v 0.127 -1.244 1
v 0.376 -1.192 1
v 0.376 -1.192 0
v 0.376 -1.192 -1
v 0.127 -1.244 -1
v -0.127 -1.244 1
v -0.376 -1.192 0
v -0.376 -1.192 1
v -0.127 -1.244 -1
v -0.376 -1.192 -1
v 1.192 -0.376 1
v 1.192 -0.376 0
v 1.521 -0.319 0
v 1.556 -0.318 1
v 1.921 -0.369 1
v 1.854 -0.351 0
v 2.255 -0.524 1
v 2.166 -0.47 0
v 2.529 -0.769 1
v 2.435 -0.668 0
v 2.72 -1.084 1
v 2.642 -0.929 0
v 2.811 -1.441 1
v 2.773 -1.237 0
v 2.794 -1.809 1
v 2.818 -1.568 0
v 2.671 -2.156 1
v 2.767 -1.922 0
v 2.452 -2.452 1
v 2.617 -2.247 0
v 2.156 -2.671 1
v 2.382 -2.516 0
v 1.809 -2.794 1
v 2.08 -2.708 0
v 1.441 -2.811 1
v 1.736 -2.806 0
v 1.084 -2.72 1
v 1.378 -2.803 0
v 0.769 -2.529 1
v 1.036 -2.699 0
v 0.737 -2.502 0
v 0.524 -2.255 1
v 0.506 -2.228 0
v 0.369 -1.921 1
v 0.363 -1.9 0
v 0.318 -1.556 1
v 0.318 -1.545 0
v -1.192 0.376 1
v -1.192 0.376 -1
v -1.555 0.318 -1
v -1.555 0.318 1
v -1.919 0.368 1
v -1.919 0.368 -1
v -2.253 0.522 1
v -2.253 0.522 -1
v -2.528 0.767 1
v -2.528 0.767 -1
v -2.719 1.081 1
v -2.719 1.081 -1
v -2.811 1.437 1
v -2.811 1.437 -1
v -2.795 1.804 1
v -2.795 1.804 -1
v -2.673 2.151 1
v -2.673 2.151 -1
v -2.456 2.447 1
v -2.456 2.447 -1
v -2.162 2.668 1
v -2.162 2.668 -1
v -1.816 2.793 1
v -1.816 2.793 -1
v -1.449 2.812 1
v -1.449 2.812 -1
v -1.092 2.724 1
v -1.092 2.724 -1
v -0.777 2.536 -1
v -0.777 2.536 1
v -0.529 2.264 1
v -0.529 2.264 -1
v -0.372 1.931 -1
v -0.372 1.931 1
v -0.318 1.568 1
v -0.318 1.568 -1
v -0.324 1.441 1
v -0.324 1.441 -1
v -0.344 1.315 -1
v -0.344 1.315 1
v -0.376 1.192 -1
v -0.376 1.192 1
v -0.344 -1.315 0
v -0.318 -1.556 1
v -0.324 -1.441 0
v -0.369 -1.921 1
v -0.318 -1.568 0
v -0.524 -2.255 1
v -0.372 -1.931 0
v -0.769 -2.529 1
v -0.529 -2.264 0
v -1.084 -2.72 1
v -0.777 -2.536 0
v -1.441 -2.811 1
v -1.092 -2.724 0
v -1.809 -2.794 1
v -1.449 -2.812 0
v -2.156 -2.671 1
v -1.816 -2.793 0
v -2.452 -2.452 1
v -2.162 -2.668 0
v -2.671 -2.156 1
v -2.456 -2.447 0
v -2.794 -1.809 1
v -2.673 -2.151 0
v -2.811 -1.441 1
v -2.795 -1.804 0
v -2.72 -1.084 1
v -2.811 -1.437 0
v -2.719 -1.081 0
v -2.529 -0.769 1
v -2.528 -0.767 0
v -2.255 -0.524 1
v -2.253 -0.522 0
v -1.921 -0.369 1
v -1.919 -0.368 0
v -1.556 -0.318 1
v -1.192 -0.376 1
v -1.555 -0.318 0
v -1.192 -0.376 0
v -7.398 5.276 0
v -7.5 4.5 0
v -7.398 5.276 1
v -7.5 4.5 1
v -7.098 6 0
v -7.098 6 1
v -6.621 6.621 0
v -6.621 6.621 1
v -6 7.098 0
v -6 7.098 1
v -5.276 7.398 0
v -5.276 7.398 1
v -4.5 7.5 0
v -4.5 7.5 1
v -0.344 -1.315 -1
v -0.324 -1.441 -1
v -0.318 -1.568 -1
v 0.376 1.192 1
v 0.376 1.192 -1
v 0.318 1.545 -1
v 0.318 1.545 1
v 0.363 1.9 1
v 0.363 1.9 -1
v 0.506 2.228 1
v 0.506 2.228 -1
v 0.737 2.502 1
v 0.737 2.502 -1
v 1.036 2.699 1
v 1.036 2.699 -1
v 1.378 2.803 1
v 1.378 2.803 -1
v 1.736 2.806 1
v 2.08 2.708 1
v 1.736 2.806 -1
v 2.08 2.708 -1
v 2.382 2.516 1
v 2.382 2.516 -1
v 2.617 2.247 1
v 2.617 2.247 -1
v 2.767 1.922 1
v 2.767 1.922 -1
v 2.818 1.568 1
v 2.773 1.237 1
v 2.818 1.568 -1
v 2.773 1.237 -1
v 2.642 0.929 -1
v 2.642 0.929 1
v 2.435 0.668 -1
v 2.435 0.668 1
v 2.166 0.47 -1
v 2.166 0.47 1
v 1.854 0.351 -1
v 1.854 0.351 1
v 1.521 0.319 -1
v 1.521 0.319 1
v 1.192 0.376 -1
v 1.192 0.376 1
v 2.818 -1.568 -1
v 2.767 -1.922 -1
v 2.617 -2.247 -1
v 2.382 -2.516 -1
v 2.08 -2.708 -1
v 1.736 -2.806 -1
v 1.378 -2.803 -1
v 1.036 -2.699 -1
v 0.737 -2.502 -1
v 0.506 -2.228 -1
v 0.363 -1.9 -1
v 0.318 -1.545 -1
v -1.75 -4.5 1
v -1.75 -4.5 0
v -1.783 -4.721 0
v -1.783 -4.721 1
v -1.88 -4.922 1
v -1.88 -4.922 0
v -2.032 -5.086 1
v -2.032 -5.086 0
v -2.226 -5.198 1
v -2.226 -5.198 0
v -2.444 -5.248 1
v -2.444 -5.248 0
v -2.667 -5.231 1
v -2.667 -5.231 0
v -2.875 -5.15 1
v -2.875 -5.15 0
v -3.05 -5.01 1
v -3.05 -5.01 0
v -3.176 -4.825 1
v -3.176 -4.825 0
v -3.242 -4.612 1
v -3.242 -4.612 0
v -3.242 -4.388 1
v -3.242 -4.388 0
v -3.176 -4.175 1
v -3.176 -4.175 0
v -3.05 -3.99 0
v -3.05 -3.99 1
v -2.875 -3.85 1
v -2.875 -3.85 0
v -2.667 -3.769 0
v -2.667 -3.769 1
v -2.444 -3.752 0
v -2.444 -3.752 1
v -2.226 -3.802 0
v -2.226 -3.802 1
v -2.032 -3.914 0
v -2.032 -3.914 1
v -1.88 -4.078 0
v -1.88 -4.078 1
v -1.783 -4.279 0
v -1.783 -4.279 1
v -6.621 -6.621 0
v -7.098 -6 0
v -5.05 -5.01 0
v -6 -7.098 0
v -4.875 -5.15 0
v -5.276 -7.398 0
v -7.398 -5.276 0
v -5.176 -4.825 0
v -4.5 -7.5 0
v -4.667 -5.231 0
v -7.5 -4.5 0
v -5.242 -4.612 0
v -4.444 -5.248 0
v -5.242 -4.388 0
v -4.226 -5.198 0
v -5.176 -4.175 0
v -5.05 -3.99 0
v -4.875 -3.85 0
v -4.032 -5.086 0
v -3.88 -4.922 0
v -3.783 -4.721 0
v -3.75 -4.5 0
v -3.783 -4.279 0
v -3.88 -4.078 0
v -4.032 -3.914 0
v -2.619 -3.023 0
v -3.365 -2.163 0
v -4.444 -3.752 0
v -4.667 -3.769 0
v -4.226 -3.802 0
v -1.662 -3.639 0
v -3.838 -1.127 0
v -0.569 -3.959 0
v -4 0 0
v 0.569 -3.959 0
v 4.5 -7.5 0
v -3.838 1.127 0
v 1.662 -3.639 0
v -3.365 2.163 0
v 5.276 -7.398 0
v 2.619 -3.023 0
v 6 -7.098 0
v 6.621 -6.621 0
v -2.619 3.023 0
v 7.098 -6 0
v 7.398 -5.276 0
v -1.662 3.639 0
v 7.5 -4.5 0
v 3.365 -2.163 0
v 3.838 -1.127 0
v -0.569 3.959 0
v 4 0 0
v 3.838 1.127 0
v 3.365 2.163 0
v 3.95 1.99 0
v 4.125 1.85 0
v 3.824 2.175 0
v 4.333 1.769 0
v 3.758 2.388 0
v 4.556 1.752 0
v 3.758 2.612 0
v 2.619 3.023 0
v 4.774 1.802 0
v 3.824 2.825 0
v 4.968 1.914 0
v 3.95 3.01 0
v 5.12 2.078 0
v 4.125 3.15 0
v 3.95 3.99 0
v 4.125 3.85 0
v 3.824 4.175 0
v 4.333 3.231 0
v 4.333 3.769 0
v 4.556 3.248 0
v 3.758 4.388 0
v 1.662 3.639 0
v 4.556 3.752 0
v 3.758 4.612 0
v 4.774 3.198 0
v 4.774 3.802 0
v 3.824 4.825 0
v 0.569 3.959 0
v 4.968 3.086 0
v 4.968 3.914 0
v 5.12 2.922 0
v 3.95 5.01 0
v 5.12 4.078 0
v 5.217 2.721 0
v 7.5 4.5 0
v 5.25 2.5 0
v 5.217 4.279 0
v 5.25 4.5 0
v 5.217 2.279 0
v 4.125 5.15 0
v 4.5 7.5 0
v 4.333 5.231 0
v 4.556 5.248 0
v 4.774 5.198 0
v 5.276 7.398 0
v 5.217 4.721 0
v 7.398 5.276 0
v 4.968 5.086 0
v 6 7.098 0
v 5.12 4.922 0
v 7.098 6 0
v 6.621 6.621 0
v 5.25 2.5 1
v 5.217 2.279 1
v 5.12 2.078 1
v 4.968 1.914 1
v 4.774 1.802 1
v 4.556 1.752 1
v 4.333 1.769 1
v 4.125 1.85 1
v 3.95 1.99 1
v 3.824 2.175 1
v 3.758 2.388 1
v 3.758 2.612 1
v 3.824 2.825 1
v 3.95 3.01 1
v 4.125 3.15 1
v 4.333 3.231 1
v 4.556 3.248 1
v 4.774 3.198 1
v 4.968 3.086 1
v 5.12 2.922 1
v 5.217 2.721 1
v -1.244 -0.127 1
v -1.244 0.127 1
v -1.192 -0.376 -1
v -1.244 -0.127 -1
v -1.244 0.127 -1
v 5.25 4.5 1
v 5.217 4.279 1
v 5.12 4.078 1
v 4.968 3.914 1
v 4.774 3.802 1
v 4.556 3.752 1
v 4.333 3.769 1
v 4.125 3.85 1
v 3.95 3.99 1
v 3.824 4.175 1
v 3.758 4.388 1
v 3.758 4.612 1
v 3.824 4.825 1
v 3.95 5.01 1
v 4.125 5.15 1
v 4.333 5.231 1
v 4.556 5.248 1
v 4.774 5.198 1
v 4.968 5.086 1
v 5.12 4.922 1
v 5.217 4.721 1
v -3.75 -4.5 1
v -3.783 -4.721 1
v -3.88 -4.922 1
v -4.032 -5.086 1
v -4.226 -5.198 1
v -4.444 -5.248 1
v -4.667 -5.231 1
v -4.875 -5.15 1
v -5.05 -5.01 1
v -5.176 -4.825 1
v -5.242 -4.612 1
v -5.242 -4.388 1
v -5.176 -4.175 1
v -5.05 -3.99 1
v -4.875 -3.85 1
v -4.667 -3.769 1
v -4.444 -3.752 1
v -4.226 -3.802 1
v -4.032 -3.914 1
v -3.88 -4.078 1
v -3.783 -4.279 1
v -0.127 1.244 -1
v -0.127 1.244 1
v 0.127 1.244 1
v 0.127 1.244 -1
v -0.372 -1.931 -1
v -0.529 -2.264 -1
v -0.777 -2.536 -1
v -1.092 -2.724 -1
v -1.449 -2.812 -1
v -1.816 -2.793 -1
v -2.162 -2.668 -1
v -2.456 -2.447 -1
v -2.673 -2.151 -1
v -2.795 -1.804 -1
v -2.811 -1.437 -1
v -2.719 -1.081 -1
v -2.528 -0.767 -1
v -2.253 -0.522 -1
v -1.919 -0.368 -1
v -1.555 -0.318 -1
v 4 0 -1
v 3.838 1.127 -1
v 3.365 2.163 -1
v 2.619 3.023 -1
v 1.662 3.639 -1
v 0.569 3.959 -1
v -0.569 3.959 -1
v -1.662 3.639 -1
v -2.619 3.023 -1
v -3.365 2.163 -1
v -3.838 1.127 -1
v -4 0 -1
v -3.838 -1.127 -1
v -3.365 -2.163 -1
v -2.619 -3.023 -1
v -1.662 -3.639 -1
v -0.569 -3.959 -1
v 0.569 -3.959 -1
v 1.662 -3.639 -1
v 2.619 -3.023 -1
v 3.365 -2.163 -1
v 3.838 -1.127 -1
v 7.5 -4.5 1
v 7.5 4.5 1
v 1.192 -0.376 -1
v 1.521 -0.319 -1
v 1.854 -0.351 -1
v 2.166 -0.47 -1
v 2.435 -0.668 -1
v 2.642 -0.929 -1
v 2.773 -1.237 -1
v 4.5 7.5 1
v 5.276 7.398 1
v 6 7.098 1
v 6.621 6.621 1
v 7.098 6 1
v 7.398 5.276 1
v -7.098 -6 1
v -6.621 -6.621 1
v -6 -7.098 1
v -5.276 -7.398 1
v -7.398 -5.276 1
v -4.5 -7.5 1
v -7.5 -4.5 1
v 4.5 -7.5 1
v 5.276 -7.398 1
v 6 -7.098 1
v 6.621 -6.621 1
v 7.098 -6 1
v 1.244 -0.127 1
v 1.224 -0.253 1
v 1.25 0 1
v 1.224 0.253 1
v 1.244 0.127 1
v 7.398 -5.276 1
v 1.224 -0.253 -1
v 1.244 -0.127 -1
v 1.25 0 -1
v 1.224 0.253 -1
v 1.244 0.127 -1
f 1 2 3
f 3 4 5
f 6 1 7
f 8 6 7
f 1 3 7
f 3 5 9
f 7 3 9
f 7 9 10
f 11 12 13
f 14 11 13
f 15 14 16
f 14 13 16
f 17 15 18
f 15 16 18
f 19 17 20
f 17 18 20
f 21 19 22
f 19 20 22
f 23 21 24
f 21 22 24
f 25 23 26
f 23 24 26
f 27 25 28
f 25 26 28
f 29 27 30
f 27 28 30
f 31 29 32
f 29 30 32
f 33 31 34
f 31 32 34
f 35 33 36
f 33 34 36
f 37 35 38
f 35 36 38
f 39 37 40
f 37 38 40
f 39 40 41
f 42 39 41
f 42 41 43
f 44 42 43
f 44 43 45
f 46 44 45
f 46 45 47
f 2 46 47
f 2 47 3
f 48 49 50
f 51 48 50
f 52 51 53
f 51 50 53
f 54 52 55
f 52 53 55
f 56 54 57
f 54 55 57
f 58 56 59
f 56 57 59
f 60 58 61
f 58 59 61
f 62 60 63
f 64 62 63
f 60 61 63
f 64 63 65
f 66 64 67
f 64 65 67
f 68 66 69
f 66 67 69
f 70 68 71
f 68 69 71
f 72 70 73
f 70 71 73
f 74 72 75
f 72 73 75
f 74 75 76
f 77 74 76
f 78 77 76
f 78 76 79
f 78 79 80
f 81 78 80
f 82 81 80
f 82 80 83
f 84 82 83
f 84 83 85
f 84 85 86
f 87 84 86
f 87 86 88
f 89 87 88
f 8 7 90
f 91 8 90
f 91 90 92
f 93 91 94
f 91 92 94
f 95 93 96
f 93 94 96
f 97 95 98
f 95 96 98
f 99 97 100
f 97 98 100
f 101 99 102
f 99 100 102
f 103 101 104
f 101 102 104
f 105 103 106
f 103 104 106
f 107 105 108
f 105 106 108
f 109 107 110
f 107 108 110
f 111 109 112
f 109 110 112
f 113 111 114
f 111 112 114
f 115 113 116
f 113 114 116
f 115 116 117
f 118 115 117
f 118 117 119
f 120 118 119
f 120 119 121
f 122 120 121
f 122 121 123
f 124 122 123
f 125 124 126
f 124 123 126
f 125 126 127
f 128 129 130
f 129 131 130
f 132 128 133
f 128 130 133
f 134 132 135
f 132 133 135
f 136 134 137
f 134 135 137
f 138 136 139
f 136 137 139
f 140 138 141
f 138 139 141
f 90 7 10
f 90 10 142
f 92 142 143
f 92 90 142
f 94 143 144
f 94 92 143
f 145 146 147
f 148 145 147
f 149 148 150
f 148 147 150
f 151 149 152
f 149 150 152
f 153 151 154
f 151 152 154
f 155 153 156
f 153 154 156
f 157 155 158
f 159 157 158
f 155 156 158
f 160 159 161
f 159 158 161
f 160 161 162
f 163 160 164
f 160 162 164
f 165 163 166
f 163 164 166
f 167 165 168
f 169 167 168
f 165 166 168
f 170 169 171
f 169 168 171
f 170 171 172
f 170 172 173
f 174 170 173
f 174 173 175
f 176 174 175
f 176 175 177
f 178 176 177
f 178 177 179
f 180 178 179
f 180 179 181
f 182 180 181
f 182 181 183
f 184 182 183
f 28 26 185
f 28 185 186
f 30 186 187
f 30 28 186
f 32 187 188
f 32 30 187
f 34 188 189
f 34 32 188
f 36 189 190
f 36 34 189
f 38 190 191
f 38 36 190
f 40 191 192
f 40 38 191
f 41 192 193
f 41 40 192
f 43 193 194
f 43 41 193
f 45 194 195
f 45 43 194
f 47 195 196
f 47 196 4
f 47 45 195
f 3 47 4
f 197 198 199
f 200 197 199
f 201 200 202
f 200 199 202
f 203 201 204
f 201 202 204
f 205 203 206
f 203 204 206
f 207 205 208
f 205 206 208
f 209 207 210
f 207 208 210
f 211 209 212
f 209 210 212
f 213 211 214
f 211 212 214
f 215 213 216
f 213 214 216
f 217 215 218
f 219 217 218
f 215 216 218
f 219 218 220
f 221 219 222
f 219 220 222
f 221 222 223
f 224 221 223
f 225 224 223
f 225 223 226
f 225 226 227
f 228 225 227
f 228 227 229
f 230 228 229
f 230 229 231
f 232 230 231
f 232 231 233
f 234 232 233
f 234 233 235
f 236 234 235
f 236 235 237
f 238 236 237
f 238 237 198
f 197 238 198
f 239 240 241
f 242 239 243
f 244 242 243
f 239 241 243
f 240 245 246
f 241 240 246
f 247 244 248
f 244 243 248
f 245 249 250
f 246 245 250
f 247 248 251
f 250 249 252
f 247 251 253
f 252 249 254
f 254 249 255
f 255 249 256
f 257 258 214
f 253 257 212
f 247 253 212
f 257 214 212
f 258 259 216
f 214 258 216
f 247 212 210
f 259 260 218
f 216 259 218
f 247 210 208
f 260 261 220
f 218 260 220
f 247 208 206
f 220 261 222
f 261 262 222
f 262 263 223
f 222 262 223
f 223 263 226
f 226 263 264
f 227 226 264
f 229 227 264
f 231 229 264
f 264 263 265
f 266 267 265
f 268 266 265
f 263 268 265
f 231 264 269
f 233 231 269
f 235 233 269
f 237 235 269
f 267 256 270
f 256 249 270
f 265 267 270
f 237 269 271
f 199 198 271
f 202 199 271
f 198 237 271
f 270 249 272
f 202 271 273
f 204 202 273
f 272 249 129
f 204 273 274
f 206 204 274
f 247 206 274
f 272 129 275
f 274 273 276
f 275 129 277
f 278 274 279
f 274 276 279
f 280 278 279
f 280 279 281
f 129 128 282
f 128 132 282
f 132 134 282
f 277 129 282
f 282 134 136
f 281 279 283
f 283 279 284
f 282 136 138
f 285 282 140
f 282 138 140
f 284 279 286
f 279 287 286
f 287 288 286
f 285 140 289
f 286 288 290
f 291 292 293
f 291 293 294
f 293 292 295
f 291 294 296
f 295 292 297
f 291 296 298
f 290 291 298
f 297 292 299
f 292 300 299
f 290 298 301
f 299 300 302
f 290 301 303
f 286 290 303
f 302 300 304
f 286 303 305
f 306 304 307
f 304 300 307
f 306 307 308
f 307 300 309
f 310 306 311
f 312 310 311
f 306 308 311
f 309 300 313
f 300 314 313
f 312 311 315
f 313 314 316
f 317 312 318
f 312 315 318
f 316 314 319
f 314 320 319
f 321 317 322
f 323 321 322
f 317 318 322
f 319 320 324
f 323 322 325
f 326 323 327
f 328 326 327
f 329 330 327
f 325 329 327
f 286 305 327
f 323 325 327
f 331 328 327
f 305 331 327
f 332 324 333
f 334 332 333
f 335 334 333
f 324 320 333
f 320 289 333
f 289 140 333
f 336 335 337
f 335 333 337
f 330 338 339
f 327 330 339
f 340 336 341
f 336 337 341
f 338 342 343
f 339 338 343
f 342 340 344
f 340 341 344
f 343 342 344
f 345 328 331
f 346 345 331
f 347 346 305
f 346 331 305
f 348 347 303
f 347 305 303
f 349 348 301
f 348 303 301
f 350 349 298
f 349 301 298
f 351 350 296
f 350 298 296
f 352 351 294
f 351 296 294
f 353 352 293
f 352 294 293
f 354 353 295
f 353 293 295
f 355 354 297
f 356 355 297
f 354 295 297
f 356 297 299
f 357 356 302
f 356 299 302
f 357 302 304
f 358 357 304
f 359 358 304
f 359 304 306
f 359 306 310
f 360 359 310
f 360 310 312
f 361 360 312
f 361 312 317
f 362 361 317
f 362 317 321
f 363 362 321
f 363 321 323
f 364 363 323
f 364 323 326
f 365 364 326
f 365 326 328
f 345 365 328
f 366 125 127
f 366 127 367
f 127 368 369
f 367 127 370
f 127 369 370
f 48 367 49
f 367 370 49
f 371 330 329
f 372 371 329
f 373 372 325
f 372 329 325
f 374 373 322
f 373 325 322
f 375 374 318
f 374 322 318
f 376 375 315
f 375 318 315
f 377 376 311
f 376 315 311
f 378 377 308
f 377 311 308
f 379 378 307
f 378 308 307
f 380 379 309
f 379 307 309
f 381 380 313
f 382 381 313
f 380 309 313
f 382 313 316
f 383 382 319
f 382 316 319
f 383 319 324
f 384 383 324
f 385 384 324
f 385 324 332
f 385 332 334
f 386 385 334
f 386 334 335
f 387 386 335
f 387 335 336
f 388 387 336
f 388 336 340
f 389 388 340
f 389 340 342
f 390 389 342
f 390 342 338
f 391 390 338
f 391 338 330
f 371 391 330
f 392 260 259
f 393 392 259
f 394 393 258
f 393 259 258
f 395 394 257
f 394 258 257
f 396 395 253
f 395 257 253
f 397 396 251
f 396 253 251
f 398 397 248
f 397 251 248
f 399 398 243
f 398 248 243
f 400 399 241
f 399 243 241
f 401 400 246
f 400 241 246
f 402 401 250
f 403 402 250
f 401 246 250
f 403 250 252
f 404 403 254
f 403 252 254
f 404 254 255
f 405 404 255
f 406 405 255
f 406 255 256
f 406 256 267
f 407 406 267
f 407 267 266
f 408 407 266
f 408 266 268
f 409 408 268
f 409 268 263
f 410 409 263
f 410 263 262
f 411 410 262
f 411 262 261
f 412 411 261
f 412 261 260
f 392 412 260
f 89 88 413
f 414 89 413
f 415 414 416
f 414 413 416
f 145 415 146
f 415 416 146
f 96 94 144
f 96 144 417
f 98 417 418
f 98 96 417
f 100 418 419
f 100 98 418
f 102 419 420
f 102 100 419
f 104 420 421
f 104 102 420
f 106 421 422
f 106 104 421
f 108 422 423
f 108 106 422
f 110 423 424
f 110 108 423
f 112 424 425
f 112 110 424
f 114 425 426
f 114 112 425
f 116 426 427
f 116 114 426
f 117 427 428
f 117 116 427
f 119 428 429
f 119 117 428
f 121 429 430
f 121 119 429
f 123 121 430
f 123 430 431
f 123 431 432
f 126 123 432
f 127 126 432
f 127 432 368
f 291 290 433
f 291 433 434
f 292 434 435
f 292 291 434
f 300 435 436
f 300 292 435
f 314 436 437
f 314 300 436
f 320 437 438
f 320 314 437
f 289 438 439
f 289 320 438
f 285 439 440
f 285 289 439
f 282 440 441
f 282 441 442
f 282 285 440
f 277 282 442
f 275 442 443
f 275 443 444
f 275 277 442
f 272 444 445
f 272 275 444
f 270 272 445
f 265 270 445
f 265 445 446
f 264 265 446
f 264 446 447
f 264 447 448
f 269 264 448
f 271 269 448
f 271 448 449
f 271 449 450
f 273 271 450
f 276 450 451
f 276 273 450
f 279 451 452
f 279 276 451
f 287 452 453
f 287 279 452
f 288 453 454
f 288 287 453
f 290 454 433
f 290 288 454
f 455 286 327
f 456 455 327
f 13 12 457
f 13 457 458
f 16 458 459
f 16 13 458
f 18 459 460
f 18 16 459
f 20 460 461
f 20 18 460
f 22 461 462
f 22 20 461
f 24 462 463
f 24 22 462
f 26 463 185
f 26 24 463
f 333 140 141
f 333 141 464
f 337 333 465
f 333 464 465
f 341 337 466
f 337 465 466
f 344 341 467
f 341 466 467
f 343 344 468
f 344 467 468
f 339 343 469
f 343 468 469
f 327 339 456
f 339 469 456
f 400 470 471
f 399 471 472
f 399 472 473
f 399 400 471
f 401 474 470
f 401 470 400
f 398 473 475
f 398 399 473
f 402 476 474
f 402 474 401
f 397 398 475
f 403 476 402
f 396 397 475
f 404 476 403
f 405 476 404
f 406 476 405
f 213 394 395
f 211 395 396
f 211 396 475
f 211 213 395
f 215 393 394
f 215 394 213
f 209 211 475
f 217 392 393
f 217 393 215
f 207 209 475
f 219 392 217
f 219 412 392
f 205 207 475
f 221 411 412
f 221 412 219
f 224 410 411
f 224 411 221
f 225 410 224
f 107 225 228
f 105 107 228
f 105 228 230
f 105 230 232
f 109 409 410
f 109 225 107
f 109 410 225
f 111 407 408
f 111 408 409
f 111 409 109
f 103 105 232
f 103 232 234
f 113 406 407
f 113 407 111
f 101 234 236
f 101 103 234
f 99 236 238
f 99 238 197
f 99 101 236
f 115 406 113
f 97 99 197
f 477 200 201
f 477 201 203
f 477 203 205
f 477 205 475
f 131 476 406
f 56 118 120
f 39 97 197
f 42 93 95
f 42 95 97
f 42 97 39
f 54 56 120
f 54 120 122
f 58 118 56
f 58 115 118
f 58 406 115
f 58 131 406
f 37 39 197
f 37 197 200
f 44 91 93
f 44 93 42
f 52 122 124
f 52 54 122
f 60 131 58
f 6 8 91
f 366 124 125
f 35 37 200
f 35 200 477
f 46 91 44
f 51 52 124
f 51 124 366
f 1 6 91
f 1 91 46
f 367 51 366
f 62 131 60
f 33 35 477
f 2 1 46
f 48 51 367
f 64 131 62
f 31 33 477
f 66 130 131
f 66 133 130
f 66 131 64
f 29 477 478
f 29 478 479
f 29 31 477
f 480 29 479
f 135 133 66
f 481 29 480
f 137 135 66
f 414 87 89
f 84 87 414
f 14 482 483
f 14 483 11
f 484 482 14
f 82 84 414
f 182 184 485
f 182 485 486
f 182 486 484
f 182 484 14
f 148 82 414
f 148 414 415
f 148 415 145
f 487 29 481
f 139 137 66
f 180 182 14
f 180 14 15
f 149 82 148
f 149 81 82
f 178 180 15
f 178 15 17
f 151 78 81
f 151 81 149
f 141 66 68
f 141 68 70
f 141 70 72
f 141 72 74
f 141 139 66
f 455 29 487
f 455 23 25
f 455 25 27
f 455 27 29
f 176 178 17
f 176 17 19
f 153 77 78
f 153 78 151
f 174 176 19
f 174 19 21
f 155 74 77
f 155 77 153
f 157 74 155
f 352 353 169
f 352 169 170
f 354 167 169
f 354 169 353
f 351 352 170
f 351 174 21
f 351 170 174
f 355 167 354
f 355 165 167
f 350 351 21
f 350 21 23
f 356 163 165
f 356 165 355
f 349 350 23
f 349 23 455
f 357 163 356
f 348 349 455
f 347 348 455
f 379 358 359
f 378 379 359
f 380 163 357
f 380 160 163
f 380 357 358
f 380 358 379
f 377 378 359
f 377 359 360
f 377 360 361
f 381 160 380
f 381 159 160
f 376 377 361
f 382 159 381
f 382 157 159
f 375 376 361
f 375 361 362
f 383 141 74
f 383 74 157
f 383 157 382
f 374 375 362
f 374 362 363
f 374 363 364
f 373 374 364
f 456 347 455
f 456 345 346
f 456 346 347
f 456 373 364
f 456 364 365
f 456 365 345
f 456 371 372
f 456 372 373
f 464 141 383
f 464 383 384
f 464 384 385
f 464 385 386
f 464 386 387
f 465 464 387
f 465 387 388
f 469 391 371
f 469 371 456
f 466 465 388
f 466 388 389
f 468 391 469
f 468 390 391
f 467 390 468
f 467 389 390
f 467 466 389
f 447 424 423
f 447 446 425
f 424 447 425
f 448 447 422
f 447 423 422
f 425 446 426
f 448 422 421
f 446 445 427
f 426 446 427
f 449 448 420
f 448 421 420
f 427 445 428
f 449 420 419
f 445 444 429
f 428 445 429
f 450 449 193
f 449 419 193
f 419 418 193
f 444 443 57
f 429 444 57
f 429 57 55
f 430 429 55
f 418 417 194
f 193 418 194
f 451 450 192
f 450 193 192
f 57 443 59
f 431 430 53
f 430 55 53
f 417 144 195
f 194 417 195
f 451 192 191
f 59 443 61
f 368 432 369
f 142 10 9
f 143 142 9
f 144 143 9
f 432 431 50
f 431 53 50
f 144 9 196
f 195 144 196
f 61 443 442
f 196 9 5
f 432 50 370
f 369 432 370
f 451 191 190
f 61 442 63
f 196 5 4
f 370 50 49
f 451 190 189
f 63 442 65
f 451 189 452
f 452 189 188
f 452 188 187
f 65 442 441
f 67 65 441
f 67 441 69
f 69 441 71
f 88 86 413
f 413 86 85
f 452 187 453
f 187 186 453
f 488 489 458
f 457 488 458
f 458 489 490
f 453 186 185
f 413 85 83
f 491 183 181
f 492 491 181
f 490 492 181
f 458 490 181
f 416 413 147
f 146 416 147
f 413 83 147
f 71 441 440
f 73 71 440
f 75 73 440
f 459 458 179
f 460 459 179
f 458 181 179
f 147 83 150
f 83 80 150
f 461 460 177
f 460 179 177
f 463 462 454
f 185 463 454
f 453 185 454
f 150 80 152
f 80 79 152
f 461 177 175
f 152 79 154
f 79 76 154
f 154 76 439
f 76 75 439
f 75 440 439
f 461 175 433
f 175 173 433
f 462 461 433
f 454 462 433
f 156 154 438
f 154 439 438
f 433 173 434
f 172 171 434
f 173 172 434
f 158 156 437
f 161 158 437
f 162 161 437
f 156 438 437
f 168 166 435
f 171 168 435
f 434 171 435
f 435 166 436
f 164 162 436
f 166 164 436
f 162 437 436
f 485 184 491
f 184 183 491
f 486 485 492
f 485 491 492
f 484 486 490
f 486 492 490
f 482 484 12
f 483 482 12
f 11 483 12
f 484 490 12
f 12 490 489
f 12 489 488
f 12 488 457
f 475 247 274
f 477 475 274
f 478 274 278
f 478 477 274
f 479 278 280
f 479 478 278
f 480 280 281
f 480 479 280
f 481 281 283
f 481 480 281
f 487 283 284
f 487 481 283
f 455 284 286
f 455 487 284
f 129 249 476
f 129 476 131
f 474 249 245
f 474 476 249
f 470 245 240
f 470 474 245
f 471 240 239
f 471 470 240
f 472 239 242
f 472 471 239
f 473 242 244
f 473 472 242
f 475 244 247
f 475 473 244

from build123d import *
from build123d import SkipClean  # not in build123d's __all__

# Parameters (mm, degrees)
F0_R     = 4
F1_DEPTH = 1
F2_W     = 15
F2_H     = 15
F2_R     = 5
F2_R_2   = 4
F3_DEPTH = 1
F4_R     = 3
F5_R     = 0.75
F6_DEPTH = 25


# Not quite as in the source:
# - after a boolean that leaves OpenCascade's solid faulty, fix() repairs it


with BuildPart() as f1:
    # F0 (on Top) → F1 (new body)
    with BuildSketch(Plane.XY):
        Circle(F0_R)
        with BuildLine():
            ThreePointArc((1.1922665017, 0.3755004513), (1.2354823202, 0.1899564067), (1.25, 0))
            ThreePointArc((1.25, 0), (1.2354823202, -0.1899564067), (1.1922665017, -0.3755004513))
            ThreePointArc((1.1922665017, -0.3755004513), (2.3070654164, -0.559829563), (2.817766953, -1.567766953))
            ThreePointArc((2.817766953, -1.567766953), (1.3778105463, -2.8032492732), (0.3755004513, -1.1922665017))
            ThreePointArc((0.3755004513, -1.1922665017), (0, -1.25), (-0.3755004513, -1.1922665017))
            ThreePointArc((-0.3755004513, -1.1922665017), (-0.3322846327, -1.3778105463), (-0.317766953, -1.567766953))
            ThreePointArc((-0.317766953, -1.567766953), (-2.5757043429, -2.3070654164), (-1.1922665017, -0.3755004513))
            ThreePointArc((-1.1922665017, -0.3755004513), (-1.25, 0), (-1.1922665017, 0.3755004513))
            ThreePointArc((-1.1922665017, 0.3755004513), (-2.5757043429, 2.3070654164), (-0.317766953, 1.567766953))
            ThreePointArc((-0.317766953, 1.567766953), (-0.3322846327, 1.3778105463), (-0.3755004513, 1.1922665017))
            ThreePointArc((-0.3755004513, 1.1922665017), (0, 1.25), (0.3755004513, 1.1922665017))
            ThreePointArc((0.3755004513, 1.1922665017), (1.3778105463, 2.8032492732), (2.817766953, 1.567766953))
            ThreePointArc((2.817766953, 1.567766953), (2.3070654164, 0.559829563), (1.1922665017, 0.3755004513))
        make_face(mode=Mode.SUBTRACT)
    extrude(amount=-F1_DEPTH)

    # F2 (on face) → F3 (join)
    with BuildSketch(Plane.XY):
        Rectangle(F2_W, F2_H)
        Circle(F2_R, mode=Mode.SUBTRACT)
        Circle(F2_R)
        Circle(F2_R_2, mode=Mode.SUBTRACT)
        Circle(F2_R_2)
        with BuildLine():
            ThreePointArc((1.1922665017, 0.3755004513), (1.2354823202, 0.1899564067), (1.25, 0))
            ThreePointArc((1.25, 0), (1.2354823202, -0.1899564067), (1.1922665017, -0.3755004513))
            ThreePointArc((1.1922665017, -0.3755004513), (2.4516504294, -2.4516504294), (0.3755004513, -1.1922665017))
            ThreePointArc((0.3755004513, -1.1922665017), (0, -1.25), (-0.3755004513, -1.1922665017))
            ThreePointArc((-0.3755004513, -1.1922665017), (-2.4516504294, -2.4516504294), (-1.1922665017, -0.3755004513))
            ThreePointArc((-1.1922665017, -0.3755004513), (-1.25, 0), (-1.1922665017, 0.3755004513))
            ThreePointArc((-1.1922665017, 0.3755004513), (-2.5757043429, 2.3070654164), (-0.317766953, 1.567766953))
            ThreePointArc((-0.317766953, 1.567766953), (-0.3322846327, 1.3778105463), (-0.3755004513, 1.1922665017))
            ThreePointArc((-0.3755004513, 1.1922665017), (0, 1.25), (0.3755004513, 1.1922665017))
            ThreePointArc((0.3755004513, 1.1922665017), (1.3778105463, 2.8032492732), (2.817766953, 1.567766953))
            ThreePointArc((2.817766953, 1.567766953), (2.3070654164, 0.559829563), (1.1922665017, 0.3755004513))
        make_face(mode=Mode.SUBTRACT)
    with SkipClean():  # cleaning this boolean's faces spoils the solid; the shape is the same uncleaned
        extrude(amount=F3_DEPTH)

    # F4
    f4_edges = [f1.edges().sort_by_distance(p)[0] for p in [
        (-7.5, -7.5, 0.5),
        (7.5, -7.5, 0.5),
        (-7.5, 7.5, 0.5),
        (7.5, 7.5, 0.5),
    ]]
    fillet(f4_edges, radius=F4_R)

    # F5 (on face) → F6 (cut)
    with BuildSketch(Plane(origin=(0, 0, 0), x_dir=(1, 0, 0), z_dir=(0, 0, -1))):
        with Locations((-4.5, 4.5)):
            Circle(F5_R)
        with Locations((-2.5, 4.5)):
            Circle(F5_R)
        with Locations((4.5, -4.5)):
            Circle(F5_R)
        with Locations((4.5, -2.5)):
            Circle(F5_R)
    extrude(amount=-F6_DEPTH, mode=Mode.SUBTRACT)

    add(f1.part.fix(), mode=Mode.REPLACE)


solid = f1.part
